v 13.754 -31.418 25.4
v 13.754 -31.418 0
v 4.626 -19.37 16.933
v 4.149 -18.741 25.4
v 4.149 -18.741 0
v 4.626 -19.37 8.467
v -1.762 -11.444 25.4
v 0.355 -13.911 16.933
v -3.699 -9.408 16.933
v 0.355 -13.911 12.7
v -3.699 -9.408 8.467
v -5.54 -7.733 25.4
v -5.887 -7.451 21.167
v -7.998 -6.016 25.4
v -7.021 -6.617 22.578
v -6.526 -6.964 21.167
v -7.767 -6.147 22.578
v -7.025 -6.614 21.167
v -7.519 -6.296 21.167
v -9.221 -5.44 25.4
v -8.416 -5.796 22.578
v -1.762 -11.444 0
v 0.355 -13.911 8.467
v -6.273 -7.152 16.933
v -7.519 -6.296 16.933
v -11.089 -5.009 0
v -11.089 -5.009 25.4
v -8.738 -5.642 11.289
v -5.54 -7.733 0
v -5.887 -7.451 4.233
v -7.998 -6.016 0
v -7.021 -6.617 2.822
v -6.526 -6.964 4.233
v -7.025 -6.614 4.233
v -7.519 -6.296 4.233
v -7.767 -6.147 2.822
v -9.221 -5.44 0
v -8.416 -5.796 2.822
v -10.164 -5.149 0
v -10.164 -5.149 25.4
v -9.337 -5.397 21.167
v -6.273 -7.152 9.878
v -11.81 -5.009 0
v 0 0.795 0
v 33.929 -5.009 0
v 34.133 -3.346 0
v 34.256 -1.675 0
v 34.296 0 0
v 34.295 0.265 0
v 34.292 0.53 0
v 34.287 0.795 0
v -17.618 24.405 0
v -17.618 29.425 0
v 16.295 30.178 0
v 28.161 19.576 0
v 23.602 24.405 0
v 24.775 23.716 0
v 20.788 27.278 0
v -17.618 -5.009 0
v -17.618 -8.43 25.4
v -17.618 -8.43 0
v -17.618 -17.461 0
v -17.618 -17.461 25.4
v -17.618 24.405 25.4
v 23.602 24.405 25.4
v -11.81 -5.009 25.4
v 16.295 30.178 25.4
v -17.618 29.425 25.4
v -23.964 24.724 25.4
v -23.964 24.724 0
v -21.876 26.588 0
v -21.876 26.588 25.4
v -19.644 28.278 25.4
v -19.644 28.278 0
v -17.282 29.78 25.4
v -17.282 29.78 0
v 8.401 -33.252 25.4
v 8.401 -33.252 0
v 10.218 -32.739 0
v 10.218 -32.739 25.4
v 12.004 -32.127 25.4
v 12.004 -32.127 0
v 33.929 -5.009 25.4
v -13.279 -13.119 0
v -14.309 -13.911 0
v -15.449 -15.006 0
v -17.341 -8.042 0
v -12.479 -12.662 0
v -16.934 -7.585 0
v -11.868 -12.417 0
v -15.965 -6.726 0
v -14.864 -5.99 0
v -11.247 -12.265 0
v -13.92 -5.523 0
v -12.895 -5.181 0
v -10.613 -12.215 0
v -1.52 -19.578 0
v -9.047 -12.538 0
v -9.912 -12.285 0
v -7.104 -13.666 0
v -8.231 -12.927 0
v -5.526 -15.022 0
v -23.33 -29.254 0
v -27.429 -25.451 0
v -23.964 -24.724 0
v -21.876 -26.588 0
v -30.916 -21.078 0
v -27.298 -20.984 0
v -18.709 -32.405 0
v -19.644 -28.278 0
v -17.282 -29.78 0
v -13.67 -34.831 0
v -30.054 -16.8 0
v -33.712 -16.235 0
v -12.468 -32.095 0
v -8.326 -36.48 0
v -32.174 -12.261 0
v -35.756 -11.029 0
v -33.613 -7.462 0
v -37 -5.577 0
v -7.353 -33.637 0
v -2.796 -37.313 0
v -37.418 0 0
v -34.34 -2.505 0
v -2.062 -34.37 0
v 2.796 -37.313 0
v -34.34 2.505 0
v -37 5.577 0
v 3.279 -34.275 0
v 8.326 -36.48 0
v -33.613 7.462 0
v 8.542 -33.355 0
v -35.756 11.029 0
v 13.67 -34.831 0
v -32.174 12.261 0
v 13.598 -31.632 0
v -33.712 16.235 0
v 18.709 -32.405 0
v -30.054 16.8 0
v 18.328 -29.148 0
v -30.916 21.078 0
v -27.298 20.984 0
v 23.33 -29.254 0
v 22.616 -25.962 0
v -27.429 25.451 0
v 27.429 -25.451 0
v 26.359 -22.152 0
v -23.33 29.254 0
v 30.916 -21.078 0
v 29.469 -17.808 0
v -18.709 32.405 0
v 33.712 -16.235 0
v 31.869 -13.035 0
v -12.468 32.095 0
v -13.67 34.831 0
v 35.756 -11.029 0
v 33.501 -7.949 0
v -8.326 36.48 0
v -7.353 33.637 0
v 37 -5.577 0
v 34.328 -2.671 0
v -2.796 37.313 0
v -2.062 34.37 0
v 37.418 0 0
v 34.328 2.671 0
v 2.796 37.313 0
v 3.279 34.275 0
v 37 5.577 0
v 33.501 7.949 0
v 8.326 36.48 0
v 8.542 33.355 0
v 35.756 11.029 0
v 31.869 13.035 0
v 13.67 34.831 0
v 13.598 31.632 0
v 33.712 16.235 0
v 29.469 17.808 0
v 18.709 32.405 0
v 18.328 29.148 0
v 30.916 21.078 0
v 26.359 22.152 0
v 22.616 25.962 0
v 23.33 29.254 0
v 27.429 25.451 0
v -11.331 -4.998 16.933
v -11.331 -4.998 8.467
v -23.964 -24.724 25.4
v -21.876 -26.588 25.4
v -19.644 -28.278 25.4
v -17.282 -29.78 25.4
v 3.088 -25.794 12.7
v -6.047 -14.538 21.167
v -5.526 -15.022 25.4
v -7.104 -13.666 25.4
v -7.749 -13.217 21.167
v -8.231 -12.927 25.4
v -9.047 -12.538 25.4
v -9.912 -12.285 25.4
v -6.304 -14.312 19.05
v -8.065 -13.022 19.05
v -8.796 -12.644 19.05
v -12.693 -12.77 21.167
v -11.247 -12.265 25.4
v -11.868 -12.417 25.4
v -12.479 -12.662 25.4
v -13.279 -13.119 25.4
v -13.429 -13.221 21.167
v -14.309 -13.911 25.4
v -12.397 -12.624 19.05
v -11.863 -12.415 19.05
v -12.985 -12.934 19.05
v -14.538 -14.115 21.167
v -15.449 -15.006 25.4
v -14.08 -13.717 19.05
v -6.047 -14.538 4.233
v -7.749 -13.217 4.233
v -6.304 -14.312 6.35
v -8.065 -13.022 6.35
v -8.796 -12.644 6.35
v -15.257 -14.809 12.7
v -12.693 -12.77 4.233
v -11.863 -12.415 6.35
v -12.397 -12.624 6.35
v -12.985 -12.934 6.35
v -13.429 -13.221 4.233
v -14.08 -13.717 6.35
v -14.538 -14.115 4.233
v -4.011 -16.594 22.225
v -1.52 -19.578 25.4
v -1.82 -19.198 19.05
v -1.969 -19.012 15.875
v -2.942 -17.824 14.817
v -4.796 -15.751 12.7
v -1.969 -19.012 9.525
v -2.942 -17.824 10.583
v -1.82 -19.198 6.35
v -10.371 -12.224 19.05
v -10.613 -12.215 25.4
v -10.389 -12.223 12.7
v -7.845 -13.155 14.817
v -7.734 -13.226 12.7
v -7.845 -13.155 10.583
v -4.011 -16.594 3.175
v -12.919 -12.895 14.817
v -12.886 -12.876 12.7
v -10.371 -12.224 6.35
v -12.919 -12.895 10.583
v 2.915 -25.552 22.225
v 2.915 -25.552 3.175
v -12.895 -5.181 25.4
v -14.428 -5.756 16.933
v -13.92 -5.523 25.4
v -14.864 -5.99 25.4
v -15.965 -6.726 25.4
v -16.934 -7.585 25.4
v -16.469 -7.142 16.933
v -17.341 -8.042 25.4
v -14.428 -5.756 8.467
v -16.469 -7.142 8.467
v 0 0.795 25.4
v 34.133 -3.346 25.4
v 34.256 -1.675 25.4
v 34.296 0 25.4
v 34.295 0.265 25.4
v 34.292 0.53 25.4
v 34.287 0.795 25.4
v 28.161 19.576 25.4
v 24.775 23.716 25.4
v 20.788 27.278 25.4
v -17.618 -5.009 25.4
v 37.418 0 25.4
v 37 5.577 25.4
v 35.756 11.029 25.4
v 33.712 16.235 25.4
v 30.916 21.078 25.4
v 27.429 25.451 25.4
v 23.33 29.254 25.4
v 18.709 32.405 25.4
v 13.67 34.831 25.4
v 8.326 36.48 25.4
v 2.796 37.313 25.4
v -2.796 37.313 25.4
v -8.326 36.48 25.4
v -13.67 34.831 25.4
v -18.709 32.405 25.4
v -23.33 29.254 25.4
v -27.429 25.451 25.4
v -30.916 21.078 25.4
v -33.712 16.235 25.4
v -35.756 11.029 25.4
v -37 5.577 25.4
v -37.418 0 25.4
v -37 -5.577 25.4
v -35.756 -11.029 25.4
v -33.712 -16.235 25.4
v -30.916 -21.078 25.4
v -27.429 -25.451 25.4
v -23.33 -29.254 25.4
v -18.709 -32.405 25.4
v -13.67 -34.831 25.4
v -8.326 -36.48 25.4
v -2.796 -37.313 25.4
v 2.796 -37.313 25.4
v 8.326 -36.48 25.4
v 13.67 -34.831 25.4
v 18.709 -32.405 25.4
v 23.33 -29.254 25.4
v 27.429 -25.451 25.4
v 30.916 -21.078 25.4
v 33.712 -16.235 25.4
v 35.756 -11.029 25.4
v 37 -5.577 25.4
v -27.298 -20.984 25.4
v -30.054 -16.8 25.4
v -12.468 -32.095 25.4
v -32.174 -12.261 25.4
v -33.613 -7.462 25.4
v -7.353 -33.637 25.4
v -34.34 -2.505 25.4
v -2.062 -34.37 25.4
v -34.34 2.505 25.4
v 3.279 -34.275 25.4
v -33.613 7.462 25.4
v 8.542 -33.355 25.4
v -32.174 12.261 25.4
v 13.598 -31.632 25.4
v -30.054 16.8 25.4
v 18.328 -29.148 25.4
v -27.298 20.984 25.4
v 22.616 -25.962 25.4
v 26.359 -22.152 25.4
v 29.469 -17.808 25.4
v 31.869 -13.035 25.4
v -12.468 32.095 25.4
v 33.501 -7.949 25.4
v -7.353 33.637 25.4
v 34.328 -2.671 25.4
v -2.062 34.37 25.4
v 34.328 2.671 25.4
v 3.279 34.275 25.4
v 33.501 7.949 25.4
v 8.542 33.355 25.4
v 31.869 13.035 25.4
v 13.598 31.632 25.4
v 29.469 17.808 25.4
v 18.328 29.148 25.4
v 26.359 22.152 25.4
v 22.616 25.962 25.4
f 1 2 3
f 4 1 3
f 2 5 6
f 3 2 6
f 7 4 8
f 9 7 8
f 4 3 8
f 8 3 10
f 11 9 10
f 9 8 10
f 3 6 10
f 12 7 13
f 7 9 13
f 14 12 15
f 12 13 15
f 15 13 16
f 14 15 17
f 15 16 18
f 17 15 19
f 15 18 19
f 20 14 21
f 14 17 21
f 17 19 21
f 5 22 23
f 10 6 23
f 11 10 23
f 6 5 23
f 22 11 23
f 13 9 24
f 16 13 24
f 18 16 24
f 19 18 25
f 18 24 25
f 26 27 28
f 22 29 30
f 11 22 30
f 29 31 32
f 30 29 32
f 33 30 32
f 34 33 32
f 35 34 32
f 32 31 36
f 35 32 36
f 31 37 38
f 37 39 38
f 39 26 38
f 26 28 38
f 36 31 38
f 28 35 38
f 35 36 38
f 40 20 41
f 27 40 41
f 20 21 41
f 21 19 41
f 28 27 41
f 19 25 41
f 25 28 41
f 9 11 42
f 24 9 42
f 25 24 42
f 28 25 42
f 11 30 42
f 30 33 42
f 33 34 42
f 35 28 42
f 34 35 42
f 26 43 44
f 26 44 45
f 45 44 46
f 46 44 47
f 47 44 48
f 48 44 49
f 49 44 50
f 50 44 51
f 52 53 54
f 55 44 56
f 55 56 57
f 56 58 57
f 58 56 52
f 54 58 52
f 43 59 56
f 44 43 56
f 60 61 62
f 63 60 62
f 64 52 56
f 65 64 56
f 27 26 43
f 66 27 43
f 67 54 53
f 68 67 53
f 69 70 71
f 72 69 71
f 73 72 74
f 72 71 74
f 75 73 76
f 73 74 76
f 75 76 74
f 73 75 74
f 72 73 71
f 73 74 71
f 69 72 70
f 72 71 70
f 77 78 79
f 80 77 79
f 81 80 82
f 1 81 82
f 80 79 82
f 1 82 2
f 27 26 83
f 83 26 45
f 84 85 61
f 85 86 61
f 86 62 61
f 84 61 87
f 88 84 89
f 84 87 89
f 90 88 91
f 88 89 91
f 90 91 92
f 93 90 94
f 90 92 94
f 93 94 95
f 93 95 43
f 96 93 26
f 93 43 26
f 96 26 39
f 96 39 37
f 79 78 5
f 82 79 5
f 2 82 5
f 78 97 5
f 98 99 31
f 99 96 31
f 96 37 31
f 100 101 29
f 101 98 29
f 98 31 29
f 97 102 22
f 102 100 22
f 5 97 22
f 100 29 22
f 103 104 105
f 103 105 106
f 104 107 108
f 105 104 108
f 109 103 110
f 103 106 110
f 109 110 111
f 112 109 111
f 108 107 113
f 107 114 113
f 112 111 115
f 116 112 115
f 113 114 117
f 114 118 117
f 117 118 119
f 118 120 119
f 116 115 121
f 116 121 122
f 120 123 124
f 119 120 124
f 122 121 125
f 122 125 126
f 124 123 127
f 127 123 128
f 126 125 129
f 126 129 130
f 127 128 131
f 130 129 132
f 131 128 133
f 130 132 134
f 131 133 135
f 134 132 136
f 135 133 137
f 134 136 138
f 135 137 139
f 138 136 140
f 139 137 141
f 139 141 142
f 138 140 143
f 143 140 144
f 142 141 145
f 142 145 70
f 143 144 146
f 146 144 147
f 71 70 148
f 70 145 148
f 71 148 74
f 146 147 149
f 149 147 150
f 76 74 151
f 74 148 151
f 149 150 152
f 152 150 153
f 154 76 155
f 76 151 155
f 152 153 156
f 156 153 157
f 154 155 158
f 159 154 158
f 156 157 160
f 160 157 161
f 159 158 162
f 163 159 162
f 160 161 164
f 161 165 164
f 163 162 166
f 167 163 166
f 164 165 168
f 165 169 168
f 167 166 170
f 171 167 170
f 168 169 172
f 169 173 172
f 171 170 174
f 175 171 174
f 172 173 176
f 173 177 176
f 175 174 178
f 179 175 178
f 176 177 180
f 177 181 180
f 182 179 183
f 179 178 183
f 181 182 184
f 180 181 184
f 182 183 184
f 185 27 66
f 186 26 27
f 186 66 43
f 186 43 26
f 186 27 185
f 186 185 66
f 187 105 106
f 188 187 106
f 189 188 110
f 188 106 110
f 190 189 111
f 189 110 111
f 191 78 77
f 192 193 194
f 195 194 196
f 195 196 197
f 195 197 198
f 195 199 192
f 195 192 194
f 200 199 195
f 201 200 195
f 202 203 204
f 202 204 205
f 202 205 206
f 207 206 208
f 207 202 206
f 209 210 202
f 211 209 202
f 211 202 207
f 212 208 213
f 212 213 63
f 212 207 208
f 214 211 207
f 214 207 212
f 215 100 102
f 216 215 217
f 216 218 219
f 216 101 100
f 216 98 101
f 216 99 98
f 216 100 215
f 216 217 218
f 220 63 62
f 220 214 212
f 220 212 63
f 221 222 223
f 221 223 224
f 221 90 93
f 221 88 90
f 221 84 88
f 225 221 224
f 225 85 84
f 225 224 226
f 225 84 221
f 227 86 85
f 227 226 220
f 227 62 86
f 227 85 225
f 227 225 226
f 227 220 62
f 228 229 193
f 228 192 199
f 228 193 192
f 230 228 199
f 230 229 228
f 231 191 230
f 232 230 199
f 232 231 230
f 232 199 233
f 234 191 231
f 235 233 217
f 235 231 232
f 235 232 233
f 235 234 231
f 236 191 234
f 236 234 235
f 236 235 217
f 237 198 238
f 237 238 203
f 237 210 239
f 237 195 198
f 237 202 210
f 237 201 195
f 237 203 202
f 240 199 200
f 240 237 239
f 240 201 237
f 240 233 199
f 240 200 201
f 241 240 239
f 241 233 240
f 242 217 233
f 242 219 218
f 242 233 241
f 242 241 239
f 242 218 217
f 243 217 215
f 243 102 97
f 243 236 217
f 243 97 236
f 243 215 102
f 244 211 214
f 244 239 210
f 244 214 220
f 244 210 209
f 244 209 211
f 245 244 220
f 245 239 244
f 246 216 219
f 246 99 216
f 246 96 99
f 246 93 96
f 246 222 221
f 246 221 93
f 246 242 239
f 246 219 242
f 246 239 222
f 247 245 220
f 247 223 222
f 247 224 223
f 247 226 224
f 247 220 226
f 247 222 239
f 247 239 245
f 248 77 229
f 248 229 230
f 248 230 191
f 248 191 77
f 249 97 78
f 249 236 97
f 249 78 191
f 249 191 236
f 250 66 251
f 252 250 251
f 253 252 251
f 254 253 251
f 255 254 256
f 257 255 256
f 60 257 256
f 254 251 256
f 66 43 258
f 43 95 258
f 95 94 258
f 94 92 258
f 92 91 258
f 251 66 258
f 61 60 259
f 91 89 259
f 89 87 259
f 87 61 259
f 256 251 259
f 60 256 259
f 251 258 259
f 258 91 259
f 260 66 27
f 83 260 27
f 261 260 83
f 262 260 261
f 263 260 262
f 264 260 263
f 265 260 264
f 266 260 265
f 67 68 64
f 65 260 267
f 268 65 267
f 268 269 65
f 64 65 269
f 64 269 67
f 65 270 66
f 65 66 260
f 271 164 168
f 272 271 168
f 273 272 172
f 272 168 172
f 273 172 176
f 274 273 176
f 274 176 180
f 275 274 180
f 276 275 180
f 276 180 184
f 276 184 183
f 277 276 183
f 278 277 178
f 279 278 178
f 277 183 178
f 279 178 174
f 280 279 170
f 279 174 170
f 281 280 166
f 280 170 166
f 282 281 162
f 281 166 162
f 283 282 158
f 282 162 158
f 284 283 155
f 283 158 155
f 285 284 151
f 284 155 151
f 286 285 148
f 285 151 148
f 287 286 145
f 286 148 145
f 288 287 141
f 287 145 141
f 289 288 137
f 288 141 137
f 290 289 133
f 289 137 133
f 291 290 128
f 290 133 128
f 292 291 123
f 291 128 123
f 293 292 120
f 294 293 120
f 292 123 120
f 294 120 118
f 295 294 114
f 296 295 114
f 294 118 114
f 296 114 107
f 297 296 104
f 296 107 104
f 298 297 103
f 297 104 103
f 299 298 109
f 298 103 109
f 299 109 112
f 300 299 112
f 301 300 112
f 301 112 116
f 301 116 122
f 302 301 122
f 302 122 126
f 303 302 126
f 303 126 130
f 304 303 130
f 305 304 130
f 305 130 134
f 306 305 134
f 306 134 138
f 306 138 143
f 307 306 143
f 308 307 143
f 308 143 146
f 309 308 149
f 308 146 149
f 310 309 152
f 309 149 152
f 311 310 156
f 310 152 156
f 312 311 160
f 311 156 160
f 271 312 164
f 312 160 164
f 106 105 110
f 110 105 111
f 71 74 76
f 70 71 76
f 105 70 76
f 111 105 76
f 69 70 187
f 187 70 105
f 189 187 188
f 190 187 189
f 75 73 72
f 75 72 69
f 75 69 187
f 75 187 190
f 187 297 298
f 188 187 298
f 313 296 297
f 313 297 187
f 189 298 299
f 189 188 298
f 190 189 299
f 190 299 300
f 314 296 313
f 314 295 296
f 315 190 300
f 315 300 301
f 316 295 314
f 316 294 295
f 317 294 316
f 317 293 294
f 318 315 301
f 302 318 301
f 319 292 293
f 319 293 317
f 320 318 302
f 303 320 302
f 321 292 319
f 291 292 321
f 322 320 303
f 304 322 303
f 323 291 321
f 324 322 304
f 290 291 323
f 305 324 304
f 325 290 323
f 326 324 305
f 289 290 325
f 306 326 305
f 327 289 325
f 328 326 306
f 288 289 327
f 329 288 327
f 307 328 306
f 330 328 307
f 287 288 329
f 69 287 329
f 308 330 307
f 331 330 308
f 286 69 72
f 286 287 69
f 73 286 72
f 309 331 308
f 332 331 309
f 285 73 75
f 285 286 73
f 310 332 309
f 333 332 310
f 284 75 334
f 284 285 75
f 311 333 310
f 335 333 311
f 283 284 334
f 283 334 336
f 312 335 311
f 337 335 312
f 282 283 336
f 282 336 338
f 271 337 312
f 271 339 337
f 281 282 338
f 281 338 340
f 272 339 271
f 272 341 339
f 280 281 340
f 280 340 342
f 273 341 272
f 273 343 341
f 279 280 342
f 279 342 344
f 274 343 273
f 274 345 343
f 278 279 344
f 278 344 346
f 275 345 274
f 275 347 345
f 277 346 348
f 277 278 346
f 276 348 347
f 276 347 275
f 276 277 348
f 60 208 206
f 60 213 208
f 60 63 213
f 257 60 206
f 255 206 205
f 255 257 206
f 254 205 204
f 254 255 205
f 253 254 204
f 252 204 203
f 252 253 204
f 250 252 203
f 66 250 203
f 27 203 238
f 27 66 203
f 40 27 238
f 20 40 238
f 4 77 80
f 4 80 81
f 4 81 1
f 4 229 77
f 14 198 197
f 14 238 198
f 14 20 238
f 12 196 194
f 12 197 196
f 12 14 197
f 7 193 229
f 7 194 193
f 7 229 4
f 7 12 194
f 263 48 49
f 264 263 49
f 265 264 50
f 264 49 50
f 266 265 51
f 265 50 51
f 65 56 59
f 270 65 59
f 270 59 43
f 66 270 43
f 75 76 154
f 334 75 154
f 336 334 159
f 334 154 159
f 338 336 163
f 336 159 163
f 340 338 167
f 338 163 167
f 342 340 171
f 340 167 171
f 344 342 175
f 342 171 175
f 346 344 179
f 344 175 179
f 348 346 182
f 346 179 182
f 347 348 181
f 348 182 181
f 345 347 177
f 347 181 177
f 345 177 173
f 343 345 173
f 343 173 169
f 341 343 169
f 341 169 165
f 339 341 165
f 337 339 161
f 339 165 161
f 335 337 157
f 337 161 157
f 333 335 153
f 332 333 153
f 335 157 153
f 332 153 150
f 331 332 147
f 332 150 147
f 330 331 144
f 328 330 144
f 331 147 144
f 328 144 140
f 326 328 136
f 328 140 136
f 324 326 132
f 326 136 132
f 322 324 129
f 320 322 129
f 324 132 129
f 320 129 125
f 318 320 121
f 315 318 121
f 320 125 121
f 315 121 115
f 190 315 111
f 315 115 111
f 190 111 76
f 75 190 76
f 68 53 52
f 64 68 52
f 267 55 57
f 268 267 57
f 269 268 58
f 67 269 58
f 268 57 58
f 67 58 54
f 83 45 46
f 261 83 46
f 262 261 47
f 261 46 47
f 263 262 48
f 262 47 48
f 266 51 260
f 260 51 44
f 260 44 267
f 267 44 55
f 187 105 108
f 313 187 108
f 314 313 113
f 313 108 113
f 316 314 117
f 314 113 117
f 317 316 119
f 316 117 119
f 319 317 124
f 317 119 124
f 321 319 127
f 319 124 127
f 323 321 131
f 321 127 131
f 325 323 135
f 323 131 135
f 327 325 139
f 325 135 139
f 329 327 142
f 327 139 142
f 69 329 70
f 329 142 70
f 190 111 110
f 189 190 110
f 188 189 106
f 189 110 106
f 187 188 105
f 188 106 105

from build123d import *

# Parameters (mm, degrees)
F1_DEPTH = 25.4
F2_R     = 37.4178761055
F3_DEPTH = 25.4
F4_DEPTH = 25.4
F5_DEPTH = 25.4


with BuildPart() as f1:
    # F0 (on Top) → F1 (new body)
    with BuildSketch(Plane.XY):
        with BuildLine():
            ThreePointArc((33.9287684393, -5.0087413818), (34.2044316104, -2.511110561), (34.2964840478, 0))
            ThreePointArc((34.2964840478, 0), (34.294180077, 0.3975309867), (34.2872684742, 0.7950085626))
            Line((34.2872684742, 0.7950085626), (0, 0.7950085626))
            Line((0, 0.7950085626), (28.1605856089, 19.5762671672))
            ThreePointArc((28.1605856089, 19.5762671672), (22.8512903751, 25.5747403943), (16.2953421659, 30.1779827314))
            Line((16.2953421659, 30.1779827314), (-17.6180669408, 29.4253723053))
            Line((-17.6180669408, 29.4253723053), (-17.6180669408, 24.4052867492))
            Line((-17.6180669408, 24.4052867492), (23.6015916839, 24.4052867492))
            Line((23.6015916839, 24.4052867492), (-17.6180669408, -5.0087413818))
            Line((-17.6180669408, -5.0087413818), (-11.8098608539, -5.0087413818))
            add(Edge.make_bspline(
                [(-11.0894667073, -5.0087413818), (-11.3318705064, -4.9925762286), (-11.5722884577, -4.9932489761), (-11.8098608539, -5.0087413818)],
                knots=[0.5915948405, 0.5915948405, 0.5915948405, 0.5915948405, 0.6124411079, 0.6124411079, 0.6124411079, 0.6124411079], degree=3))
            Line((-11.0894667073, -5.0087413818), (33.9287684393, -5.0087413818))
        make_face()
    extrude(amount=F1_DEPTH)


with BuildPart() as f1b:
    # F0 (on Top) → F1, piece 2 (new body)
    with BuildSketch(Plane.XY):
        with BuildLine():
            ThreePointArc((8.4011441477, -33.2516104129), (11.1152325274, -32.4453451808), (13.7535686729, -31.4179593036))
            add(Edge.make_bspline(
                [(13.7535686729, -31.4179593036), (4.2681861669, -19.4868780673), (-4.2103053415, -5.4674911927), (-11.0894667073, -5.0087413818)],
                knots=[0, 0, 0, 0, 0.5915948405, 0.5915948405, 0.5915948405, 0.5915948405], degree=3))
            Line((-11.0894667073, -5.0087413818), (-11.8098608539, -5.0087413818))
            add(Edge.make_bspline(
                [(-11.8098608539, -5.0087413818), (-14.612146447, -5.191482078), (-17.0185189899, -7.4361390007), (-17.6180669408, -8.4304659816)],
                knots=[0.6124411079, 0.6124411079, 0.6124411079, 0.6124411079, 0.8583332887, 0.8583332887, 0.8583332887, 0.8583332887], degree=3))
            Line((-17.6180669408, -8.4304659816), (-17.6180669408, -10.5096240812))
            Line((-17.6180669408, -10.5096240812), (-17.6180669408, -17.46085981))
            add(Edge.make_bspline(
                [(8.4011441477, -33.2516104129), (0, -21.5503783797), (-9.0143397435, -7.4555404019), (-15.2237471193, -14.6350739524), (-17.6180669408, -17.46085981)],
                knots=[0, 0, 0, 0, 0.6399382639, 1, 1, 1, 1], degree=3))
        make_face()
    extrude(amount=F1_DEPTH)


with BuildPart() as f3:
    # F2 (on Top) → F3 (new body)
    with BuildSketch(Plane.XY):
        Circle(F2_R)
        with BuildLine():
            ThreePointArc((-17.2823793981, 29.7797877568), (17.1822744509, 29.837658105), (34.4313287065, 0))
            ThreePointArc((34.4313287065, 0), (17.1822744509, -29.837658105), (-17.2823793981, -29.7797877568))
            ThreePointArc((-17.2823793981, -29.7797877568), (-20.7774401757, -27.4556802182), (-23.9637455276, -24.7235777504))
            ThreePointArc((-23.9637455276, -24.7235777504), (-34.4313287065, 0), (-23.9637455276, 24.7235777504))
            ThreePointArc((-23.9637455276, 24.7235777504), (-20.7774401757, 27.4556802182), (-17.2823793981, 29.7797877568))
        make_face(mode=Mode.SUBTRACT)
    extrude(amount=F3_DEPTH)

    # F2 (on Top) → F4 (join)
    with BuildSketch(Plane.XY):
        Circle(F2_R)
        with BuildLine():
            ThreePointArc((-17.2823793981, 29.7797877568), (17.1822744509, 29.837658105), (34.4313287065, 0))
            ThreePointArc((34.4313287065, 0), (17.1822744509, -29.837658105), (-17.2823793981, -29.7797877568))
            ThreePointArc((-17.2823793981, -29.7797877568), (-20.7774401757, -27.4556802182), (-23.9637455276, -24.7235777504))
            ThreePointArc((-23.9637455276, -24.7235777504), (-34.4313287065, 0), (-23.9637455276, 24.7235777504))
            ThreePointArc((-23.9637455276, 24.7235777504), (-20.7774401757, 27.4556802182), (-17.2823793981, 29.7797877568))
        make_face(mode=Mode.SUBTRACT)
    extrude(amount=F4_DEPTH)


with BuildPart() as f5:
    # F2 (on Top) → F5 (new body)
    with BuildSketch(Plane.XY):
        with BuildLine():
            Line((-17.2823793981, -29.7797877568), (-17.2823793981, 29.7797877568))
            ThreePointArc((-17.2823793981, 29.7797877568), (-20.7774401757, 27.4556802182), (-23.9637455276, 24.7235777504))
            Line((-23.9637455276, 24.7235777504), (-23.9637455276, -24.7235777504))
            ThreePointArc((-23.9637455276, -24.7235777504), (-20.7774401757, -27.4556802182), (-17.2823793981, -29.7797877568))
        make_face()
    extrude(amount=F5_DEPTH)


solid = Compound([f1.part, f1b.part, f3.part, f5.part])
